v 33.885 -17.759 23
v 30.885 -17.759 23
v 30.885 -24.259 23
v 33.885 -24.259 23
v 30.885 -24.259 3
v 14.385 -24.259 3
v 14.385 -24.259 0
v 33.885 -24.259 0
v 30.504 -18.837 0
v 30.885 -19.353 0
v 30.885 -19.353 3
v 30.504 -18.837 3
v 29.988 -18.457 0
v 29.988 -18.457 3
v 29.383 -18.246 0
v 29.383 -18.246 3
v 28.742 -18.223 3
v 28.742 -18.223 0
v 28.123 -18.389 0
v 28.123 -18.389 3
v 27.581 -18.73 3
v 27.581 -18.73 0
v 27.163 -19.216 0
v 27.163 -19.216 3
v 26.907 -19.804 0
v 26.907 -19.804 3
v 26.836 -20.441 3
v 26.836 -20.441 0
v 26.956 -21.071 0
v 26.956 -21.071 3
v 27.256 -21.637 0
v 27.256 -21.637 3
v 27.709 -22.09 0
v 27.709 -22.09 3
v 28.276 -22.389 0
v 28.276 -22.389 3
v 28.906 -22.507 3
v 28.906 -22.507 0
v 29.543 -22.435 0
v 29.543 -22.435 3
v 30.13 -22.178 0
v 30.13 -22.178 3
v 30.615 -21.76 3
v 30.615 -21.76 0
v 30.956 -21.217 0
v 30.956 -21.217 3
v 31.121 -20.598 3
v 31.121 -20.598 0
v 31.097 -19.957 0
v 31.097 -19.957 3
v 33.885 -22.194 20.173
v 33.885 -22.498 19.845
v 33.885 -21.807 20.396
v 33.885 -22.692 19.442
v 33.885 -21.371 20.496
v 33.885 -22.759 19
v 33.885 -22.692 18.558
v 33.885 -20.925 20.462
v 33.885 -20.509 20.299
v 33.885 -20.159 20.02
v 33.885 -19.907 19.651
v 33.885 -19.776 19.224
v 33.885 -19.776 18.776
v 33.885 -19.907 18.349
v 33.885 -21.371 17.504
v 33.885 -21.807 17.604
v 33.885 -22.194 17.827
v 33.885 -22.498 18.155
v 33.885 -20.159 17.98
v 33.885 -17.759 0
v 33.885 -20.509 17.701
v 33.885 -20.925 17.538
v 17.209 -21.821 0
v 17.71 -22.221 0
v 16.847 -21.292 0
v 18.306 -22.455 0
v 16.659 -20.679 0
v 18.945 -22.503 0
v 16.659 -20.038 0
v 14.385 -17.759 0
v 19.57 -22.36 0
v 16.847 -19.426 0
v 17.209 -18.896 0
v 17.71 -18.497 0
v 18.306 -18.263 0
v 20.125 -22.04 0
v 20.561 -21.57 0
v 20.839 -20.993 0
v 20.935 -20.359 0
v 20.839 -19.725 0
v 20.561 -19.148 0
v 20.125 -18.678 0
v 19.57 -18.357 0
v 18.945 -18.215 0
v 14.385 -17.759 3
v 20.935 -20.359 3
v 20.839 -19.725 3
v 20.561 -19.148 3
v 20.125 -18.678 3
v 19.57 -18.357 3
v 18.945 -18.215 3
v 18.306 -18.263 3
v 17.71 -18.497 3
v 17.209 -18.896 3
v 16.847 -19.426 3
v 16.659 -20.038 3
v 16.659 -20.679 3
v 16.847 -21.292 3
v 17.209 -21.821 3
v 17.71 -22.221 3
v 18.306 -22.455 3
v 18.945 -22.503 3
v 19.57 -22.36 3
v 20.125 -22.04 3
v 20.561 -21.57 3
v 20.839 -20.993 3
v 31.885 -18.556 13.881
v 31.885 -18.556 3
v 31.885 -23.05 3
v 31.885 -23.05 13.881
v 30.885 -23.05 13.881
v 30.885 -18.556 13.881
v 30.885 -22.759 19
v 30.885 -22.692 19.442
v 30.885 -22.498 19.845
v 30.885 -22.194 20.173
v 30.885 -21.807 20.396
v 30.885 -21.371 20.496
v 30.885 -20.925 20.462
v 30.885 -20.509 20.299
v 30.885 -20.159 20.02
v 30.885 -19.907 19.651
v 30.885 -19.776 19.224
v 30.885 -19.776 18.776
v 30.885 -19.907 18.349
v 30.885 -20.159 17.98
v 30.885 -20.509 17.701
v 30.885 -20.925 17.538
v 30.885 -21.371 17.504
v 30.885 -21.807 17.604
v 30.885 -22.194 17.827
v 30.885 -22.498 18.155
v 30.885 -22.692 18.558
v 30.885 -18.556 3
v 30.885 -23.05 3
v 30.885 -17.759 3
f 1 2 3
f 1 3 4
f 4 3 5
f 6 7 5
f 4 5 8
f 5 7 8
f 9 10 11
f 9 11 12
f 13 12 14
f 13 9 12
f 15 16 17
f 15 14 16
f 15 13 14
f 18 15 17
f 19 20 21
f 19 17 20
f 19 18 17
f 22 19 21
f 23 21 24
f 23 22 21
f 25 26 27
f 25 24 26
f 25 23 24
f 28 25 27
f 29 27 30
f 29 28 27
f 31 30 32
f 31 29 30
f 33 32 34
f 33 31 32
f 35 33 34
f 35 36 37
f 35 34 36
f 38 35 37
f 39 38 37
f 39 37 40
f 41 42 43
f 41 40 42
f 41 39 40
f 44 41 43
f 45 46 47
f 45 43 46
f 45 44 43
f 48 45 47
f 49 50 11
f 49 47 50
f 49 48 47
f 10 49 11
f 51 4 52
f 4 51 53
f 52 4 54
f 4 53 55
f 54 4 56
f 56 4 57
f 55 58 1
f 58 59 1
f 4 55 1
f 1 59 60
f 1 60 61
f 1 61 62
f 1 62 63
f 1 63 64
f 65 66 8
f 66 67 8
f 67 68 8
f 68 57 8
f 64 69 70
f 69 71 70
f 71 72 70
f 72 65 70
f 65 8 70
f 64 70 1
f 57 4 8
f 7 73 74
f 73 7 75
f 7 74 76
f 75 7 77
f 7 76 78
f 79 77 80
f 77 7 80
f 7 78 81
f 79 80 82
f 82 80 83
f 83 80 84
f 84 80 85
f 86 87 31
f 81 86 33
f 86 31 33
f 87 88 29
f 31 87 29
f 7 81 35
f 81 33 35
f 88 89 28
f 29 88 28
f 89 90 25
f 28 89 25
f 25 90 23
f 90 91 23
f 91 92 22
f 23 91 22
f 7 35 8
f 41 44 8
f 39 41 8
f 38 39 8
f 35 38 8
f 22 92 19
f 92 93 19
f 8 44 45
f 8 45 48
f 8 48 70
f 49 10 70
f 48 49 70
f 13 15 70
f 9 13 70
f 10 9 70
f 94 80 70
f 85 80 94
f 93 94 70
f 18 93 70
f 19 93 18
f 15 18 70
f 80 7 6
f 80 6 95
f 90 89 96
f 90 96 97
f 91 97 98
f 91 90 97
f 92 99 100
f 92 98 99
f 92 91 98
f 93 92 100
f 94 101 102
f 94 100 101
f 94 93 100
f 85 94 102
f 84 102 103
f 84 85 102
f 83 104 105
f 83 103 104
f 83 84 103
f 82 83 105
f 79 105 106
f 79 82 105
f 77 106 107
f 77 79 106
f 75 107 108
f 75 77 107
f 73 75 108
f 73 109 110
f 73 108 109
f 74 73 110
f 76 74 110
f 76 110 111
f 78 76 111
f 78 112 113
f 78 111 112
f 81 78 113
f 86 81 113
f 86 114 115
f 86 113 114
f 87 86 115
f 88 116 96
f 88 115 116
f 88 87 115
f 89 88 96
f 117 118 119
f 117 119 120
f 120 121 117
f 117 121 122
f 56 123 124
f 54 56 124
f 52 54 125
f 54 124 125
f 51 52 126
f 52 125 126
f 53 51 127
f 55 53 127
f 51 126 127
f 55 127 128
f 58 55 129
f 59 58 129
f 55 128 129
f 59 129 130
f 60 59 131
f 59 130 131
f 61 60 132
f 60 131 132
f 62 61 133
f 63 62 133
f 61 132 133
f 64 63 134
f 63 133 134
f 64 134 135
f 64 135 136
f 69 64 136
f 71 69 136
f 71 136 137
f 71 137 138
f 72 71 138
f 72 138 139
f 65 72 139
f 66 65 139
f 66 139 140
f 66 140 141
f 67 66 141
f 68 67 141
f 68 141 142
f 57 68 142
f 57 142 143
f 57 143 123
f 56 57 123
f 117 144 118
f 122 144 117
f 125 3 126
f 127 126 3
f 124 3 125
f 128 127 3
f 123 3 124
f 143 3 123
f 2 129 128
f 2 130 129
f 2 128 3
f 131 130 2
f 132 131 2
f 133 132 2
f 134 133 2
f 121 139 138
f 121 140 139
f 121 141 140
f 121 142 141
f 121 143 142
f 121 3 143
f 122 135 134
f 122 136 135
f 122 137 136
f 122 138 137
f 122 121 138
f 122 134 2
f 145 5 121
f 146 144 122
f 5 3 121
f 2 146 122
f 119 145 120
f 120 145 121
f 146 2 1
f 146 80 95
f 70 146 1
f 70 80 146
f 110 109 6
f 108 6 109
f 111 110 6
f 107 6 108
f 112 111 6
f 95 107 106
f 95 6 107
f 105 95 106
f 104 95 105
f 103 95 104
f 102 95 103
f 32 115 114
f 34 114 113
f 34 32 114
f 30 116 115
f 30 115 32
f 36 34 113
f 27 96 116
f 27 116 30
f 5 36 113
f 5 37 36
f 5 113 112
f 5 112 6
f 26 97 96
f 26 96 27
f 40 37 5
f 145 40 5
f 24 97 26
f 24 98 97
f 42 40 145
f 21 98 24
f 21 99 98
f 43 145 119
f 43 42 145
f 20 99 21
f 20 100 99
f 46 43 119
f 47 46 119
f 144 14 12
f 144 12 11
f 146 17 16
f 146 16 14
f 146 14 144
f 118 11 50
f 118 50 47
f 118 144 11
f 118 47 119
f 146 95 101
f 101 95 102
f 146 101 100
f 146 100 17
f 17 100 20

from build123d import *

# Parameters (mm, degrees)
SKETCH1_W               = 19.5
SKETCH1_H               = 6.5
BOSS_EXTRUDE1_DEPTH     = 3
SKETCH2_W               = 3
SKETCH2_H               = 6.5
BOSS_EXTRUDE2_DEPTH     = 20
SKETCH3_R               = 1.5
CUT_EXTRUDE1_DEPTH      = 10
CUT_EXTRUDE2_DEPTH      = 10
CUT_EXTRUDE2_DEPTH_BACK = 10
SKETCH4_R               = 2.15
SKETCH5_W               = 10.88141253
SKETCH5_H               = 4.494582939
CUT_EXTRUDE3_DEPTH      = 1


with BuildPart() as part:
    # Sketch1 → Boss-Extrude1 (new body)
    with BuildSketch(Plane.XY):
        with Locations((24.134573854, -21.008812853)):
            Rectangle(SKETCH1_W, SKETCH1_H)
    extrude(amount=BOSS_EXTRUDE1_DEPTH)

    # Sketch2 → Boss-Extrude2 (add)
    with BuildSketch(Plane.XY.offset(3)):
        with Locations((32.384573854, -21.008812853)):
            Rectangle(SKETCH2_W, SKETCH2_H)
    extrude(amount=BOSS_EXTRUDE2_DEPTH)

    # Sketch3 → Cut-Extrude1 (cut)
    with BuildSketch(Plane.ZY.offset(-30.884573854)):
        with Locations(Location((19, -21.258812853, 0), (0, 0, 270))):
            Circle(SKETCH3_R)
    extrude(amount=-CUT_EXTRUDE1_DEPTH, mode=Mode.SUBTRACT)

    # Sketch4 → Cut-Extrude2 (cut, two sides: drawn at the far end of the back side and taken through both)
    with BuildSketch(Plane.XY.offset(3).offset(-CUT_EXTRUDE2_DEPTH_BACK)):
        with Locations(Location((28.984573854, -20.358812853, 0), (0, 0, 27.905472791))):
            Circle(SKETCH4_R)
        with Locations((18.784573854, -20.358812853)):
            Circle(SKETCH4_R)
    extrude(amount=CUT_EXTRUDE2_DEPTH + CUT_EXTRUDE2_DEPTH_BACK, mode=Mode.SUBTRACT)

    # Sketch5 → Cut-Extrude3 (cut)
    with BuildSketch(Plane.ZY.offset(-30.884573854)):
        with Locations((8.440706265, -20.802989028)):
            Rectangle(SKETCH5_W, SKETCH5_H)
    extrude(amount=-CUT_EXTRUDE3_DEPTH, mode=Mode.SUBTRACT)


solid = part.part
